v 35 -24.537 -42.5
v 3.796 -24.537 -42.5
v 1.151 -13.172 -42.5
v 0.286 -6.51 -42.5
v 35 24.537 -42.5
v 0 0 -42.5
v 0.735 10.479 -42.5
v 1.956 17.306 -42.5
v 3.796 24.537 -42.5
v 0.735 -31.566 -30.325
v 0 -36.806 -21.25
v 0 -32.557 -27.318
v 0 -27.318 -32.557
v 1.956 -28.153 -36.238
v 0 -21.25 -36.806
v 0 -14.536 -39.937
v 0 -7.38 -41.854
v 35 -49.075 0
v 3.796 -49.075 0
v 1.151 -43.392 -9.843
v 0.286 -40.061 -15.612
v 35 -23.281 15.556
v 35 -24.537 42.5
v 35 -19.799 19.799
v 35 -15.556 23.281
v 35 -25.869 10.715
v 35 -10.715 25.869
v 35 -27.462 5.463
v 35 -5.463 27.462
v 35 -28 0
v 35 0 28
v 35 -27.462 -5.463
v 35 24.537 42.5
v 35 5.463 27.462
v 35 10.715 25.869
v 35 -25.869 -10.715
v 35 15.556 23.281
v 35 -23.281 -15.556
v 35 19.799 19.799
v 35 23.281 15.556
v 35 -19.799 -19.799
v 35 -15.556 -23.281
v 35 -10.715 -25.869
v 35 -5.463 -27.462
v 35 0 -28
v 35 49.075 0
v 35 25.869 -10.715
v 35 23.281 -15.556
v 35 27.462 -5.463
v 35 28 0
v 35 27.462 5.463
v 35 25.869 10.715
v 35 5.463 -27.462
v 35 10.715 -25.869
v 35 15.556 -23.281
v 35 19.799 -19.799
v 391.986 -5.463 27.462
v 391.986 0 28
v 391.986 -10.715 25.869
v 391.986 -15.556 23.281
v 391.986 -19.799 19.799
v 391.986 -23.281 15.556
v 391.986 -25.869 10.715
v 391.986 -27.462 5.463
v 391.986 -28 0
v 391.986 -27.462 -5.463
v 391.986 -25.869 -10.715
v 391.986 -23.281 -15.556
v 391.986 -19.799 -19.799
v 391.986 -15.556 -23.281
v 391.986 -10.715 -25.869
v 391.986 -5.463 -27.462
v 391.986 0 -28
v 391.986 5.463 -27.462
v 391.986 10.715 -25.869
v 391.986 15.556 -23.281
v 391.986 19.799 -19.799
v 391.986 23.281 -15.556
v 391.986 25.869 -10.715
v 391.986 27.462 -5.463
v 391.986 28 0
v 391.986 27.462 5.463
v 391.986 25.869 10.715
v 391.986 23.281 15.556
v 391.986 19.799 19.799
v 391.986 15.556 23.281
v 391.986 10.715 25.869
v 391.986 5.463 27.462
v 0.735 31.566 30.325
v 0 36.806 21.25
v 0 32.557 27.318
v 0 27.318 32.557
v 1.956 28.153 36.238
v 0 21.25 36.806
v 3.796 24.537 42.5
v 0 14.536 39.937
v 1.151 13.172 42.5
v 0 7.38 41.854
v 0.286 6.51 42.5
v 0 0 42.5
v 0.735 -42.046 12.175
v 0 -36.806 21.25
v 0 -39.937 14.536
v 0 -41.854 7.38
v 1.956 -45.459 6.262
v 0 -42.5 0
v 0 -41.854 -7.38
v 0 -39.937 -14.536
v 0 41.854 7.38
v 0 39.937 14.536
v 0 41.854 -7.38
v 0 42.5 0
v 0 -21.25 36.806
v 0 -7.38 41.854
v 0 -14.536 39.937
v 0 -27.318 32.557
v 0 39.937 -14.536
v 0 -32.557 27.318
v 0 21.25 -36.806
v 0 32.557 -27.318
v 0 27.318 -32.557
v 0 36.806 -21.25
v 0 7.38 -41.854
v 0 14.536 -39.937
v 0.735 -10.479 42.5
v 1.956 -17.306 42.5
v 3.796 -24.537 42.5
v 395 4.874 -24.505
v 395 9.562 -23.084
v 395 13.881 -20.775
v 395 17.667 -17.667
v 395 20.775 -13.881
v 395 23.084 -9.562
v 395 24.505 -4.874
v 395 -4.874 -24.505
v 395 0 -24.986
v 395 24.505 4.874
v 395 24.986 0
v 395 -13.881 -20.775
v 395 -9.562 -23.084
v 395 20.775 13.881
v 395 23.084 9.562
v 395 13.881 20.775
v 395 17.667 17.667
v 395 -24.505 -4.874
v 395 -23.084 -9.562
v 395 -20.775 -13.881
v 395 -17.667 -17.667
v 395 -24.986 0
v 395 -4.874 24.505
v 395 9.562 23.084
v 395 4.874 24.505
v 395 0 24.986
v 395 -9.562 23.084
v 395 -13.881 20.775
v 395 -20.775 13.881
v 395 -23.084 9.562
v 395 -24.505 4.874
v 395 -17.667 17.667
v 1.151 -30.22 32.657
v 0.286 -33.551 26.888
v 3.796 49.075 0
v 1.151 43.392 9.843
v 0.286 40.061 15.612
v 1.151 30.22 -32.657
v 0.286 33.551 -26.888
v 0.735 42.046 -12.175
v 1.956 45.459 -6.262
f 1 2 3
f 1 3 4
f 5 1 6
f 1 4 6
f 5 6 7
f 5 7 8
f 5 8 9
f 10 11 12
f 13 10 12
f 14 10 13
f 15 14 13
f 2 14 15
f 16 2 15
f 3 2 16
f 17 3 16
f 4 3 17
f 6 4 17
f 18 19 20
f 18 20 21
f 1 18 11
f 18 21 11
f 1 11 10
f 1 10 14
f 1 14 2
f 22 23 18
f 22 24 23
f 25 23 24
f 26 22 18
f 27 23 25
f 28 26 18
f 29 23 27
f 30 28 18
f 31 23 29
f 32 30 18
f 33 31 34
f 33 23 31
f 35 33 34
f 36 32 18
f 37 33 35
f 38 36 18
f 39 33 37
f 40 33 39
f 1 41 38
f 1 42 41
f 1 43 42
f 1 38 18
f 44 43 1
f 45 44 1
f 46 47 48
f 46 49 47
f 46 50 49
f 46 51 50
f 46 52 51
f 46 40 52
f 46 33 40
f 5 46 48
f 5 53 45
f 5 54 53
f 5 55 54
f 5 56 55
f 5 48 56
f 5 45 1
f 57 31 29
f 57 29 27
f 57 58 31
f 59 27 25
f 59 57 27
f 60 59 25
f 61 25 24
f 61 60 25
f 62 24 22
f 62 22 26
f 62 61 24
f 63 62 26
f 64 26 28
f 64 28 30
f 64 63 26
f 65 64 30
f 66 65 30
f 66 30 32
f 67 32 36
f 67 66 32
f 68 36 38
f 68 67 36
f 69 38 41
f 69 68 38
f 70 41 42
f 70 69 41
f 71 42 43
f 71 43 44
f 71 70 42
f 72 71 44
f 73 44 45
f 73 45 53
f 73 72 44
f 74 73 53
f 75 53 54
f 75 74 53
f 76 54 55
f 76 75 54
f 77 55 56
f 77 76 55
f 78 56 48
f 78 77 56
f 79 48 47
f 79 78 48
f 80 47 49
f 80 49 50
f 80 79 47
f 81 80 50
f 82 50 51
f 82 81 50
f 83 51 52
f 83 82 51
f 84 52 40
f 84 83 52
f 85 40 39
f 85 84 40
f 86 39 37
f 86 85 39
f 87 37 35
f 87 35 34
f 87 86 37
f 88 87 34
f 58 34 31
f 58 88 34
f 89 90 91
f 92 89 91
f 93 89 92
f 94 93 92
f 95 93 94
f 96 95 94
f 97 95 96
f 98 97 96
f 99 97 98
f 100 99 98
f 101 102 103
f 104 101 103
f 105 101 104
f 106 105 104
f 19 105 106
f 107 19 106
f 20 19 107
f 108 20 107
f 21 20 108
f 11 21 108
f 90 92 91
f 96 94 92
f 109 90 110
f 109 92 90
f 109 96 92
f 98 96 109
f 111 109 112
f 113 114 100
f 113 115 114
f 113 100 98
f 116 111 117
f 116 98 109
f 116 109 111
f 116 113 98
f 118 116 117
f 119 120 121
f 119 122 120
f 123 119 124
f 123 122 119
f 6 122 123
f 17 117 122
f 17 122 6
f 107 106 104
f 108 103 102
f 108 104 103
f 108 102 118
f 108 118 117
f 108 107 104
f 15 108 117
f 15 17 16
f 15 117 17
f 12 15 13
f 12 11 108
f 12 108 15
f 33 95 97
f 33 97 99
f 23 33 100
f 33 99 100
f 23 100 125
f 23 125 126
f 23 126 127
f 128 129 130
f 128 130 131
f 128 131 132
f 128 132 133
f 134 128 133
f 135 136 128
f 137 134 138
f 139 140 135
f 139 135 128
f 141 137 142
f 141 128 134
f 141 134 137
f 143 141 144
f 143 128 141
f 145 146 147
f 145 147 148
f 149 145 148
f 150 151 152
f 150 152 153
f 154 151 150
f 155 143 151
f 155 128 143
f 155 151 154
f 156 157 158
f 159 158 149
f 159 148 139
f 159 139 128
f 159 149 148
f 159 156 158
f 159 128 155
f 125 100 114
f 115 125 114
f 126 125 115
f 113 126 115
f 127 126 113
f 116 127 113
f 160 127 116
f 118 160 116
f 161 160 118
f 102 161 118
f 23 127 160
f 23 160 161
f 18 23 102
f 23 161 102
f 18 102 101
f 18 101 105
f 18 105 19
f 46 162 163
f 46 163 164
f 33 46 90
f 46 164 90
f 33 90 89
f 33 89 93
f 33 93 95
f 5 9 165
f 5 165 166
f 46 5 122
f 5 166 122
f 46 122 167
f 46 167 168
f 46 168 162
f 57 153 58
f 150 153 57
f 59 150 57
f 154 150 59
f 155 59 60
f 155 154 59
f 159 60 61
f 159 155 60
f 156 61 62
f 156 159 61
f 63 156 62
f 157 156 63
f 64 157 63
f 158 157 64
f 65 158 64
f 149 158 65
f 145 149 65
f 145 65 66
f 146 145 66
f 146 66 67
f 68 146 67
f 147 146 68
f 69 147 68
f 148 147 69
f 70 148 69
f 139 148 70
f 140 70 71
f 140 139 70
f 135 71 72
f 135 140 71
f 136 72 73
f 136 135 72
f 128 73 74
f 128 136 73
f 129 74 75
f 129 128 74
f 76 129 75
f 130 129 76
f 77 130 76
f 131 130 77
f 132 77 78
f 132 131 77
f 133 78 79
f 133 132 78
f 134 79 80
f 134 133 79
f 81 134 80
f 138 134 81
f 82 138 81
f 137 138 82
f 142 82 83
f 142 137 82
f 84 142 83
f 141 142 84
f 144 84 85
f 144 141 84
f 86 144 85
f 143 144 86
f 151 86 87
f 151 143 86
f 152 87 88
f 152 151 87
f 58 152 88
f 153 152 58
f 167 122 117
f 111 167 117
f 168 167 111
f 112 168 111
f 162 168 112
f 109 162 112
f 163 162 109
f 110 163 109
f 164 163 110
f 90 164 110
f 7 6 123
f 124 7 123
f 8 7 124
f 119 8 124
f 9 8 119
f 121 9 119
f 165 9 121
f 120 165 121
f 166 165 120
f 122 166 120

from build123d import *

# Parameters (mm, degrees)
BASEHEAD_DEPTH = 35


with BuildPart() as part:
    # BaseHeadSke → BaseHead (new body)
    with BuildSketch(Plane(origin=(0, 0, 0), x_dir=(0, 0, -1), z_dir=(1, 0, 0))):
        Polygon((0, 49.074772881), (-42.5, 24.537386441), (-42.5, -24.537386441), (0, -49.074772881), (42.5, -24.537386441), (42.5, 24.537386441), align=None)
    extrude(amount=BASEHEAD_DEPTH)

    # HeadChamferSke → HeadChamfer (revolve, cut)
    with BuildSketch(Plane.XY):
        Polygon((0, 49.074772881), (0, 42.5), (3.795946893, 49.074772881), align=None)
    revolve(axis=Axis((0, 0, 0), (1, 0, 0)), mode=Mode.SUBTRACT)

    # BodySke → BaseBody (revolve)
    with BuildSketch(Plane.XY, mode=Mode.PRIVATE) as basebody_sk:
        Polygon((0, 0), (0, 28), (391.9855, 28), (395, 24.9855), (395, 0), align=None)
    revolve(basebody_sk.sketch.rotate(Axis((0, 0, 0), (1, 0, 0)), 90), axis=Axis((0, 0, 0), (1, 0, 0)))


solid = part.part
